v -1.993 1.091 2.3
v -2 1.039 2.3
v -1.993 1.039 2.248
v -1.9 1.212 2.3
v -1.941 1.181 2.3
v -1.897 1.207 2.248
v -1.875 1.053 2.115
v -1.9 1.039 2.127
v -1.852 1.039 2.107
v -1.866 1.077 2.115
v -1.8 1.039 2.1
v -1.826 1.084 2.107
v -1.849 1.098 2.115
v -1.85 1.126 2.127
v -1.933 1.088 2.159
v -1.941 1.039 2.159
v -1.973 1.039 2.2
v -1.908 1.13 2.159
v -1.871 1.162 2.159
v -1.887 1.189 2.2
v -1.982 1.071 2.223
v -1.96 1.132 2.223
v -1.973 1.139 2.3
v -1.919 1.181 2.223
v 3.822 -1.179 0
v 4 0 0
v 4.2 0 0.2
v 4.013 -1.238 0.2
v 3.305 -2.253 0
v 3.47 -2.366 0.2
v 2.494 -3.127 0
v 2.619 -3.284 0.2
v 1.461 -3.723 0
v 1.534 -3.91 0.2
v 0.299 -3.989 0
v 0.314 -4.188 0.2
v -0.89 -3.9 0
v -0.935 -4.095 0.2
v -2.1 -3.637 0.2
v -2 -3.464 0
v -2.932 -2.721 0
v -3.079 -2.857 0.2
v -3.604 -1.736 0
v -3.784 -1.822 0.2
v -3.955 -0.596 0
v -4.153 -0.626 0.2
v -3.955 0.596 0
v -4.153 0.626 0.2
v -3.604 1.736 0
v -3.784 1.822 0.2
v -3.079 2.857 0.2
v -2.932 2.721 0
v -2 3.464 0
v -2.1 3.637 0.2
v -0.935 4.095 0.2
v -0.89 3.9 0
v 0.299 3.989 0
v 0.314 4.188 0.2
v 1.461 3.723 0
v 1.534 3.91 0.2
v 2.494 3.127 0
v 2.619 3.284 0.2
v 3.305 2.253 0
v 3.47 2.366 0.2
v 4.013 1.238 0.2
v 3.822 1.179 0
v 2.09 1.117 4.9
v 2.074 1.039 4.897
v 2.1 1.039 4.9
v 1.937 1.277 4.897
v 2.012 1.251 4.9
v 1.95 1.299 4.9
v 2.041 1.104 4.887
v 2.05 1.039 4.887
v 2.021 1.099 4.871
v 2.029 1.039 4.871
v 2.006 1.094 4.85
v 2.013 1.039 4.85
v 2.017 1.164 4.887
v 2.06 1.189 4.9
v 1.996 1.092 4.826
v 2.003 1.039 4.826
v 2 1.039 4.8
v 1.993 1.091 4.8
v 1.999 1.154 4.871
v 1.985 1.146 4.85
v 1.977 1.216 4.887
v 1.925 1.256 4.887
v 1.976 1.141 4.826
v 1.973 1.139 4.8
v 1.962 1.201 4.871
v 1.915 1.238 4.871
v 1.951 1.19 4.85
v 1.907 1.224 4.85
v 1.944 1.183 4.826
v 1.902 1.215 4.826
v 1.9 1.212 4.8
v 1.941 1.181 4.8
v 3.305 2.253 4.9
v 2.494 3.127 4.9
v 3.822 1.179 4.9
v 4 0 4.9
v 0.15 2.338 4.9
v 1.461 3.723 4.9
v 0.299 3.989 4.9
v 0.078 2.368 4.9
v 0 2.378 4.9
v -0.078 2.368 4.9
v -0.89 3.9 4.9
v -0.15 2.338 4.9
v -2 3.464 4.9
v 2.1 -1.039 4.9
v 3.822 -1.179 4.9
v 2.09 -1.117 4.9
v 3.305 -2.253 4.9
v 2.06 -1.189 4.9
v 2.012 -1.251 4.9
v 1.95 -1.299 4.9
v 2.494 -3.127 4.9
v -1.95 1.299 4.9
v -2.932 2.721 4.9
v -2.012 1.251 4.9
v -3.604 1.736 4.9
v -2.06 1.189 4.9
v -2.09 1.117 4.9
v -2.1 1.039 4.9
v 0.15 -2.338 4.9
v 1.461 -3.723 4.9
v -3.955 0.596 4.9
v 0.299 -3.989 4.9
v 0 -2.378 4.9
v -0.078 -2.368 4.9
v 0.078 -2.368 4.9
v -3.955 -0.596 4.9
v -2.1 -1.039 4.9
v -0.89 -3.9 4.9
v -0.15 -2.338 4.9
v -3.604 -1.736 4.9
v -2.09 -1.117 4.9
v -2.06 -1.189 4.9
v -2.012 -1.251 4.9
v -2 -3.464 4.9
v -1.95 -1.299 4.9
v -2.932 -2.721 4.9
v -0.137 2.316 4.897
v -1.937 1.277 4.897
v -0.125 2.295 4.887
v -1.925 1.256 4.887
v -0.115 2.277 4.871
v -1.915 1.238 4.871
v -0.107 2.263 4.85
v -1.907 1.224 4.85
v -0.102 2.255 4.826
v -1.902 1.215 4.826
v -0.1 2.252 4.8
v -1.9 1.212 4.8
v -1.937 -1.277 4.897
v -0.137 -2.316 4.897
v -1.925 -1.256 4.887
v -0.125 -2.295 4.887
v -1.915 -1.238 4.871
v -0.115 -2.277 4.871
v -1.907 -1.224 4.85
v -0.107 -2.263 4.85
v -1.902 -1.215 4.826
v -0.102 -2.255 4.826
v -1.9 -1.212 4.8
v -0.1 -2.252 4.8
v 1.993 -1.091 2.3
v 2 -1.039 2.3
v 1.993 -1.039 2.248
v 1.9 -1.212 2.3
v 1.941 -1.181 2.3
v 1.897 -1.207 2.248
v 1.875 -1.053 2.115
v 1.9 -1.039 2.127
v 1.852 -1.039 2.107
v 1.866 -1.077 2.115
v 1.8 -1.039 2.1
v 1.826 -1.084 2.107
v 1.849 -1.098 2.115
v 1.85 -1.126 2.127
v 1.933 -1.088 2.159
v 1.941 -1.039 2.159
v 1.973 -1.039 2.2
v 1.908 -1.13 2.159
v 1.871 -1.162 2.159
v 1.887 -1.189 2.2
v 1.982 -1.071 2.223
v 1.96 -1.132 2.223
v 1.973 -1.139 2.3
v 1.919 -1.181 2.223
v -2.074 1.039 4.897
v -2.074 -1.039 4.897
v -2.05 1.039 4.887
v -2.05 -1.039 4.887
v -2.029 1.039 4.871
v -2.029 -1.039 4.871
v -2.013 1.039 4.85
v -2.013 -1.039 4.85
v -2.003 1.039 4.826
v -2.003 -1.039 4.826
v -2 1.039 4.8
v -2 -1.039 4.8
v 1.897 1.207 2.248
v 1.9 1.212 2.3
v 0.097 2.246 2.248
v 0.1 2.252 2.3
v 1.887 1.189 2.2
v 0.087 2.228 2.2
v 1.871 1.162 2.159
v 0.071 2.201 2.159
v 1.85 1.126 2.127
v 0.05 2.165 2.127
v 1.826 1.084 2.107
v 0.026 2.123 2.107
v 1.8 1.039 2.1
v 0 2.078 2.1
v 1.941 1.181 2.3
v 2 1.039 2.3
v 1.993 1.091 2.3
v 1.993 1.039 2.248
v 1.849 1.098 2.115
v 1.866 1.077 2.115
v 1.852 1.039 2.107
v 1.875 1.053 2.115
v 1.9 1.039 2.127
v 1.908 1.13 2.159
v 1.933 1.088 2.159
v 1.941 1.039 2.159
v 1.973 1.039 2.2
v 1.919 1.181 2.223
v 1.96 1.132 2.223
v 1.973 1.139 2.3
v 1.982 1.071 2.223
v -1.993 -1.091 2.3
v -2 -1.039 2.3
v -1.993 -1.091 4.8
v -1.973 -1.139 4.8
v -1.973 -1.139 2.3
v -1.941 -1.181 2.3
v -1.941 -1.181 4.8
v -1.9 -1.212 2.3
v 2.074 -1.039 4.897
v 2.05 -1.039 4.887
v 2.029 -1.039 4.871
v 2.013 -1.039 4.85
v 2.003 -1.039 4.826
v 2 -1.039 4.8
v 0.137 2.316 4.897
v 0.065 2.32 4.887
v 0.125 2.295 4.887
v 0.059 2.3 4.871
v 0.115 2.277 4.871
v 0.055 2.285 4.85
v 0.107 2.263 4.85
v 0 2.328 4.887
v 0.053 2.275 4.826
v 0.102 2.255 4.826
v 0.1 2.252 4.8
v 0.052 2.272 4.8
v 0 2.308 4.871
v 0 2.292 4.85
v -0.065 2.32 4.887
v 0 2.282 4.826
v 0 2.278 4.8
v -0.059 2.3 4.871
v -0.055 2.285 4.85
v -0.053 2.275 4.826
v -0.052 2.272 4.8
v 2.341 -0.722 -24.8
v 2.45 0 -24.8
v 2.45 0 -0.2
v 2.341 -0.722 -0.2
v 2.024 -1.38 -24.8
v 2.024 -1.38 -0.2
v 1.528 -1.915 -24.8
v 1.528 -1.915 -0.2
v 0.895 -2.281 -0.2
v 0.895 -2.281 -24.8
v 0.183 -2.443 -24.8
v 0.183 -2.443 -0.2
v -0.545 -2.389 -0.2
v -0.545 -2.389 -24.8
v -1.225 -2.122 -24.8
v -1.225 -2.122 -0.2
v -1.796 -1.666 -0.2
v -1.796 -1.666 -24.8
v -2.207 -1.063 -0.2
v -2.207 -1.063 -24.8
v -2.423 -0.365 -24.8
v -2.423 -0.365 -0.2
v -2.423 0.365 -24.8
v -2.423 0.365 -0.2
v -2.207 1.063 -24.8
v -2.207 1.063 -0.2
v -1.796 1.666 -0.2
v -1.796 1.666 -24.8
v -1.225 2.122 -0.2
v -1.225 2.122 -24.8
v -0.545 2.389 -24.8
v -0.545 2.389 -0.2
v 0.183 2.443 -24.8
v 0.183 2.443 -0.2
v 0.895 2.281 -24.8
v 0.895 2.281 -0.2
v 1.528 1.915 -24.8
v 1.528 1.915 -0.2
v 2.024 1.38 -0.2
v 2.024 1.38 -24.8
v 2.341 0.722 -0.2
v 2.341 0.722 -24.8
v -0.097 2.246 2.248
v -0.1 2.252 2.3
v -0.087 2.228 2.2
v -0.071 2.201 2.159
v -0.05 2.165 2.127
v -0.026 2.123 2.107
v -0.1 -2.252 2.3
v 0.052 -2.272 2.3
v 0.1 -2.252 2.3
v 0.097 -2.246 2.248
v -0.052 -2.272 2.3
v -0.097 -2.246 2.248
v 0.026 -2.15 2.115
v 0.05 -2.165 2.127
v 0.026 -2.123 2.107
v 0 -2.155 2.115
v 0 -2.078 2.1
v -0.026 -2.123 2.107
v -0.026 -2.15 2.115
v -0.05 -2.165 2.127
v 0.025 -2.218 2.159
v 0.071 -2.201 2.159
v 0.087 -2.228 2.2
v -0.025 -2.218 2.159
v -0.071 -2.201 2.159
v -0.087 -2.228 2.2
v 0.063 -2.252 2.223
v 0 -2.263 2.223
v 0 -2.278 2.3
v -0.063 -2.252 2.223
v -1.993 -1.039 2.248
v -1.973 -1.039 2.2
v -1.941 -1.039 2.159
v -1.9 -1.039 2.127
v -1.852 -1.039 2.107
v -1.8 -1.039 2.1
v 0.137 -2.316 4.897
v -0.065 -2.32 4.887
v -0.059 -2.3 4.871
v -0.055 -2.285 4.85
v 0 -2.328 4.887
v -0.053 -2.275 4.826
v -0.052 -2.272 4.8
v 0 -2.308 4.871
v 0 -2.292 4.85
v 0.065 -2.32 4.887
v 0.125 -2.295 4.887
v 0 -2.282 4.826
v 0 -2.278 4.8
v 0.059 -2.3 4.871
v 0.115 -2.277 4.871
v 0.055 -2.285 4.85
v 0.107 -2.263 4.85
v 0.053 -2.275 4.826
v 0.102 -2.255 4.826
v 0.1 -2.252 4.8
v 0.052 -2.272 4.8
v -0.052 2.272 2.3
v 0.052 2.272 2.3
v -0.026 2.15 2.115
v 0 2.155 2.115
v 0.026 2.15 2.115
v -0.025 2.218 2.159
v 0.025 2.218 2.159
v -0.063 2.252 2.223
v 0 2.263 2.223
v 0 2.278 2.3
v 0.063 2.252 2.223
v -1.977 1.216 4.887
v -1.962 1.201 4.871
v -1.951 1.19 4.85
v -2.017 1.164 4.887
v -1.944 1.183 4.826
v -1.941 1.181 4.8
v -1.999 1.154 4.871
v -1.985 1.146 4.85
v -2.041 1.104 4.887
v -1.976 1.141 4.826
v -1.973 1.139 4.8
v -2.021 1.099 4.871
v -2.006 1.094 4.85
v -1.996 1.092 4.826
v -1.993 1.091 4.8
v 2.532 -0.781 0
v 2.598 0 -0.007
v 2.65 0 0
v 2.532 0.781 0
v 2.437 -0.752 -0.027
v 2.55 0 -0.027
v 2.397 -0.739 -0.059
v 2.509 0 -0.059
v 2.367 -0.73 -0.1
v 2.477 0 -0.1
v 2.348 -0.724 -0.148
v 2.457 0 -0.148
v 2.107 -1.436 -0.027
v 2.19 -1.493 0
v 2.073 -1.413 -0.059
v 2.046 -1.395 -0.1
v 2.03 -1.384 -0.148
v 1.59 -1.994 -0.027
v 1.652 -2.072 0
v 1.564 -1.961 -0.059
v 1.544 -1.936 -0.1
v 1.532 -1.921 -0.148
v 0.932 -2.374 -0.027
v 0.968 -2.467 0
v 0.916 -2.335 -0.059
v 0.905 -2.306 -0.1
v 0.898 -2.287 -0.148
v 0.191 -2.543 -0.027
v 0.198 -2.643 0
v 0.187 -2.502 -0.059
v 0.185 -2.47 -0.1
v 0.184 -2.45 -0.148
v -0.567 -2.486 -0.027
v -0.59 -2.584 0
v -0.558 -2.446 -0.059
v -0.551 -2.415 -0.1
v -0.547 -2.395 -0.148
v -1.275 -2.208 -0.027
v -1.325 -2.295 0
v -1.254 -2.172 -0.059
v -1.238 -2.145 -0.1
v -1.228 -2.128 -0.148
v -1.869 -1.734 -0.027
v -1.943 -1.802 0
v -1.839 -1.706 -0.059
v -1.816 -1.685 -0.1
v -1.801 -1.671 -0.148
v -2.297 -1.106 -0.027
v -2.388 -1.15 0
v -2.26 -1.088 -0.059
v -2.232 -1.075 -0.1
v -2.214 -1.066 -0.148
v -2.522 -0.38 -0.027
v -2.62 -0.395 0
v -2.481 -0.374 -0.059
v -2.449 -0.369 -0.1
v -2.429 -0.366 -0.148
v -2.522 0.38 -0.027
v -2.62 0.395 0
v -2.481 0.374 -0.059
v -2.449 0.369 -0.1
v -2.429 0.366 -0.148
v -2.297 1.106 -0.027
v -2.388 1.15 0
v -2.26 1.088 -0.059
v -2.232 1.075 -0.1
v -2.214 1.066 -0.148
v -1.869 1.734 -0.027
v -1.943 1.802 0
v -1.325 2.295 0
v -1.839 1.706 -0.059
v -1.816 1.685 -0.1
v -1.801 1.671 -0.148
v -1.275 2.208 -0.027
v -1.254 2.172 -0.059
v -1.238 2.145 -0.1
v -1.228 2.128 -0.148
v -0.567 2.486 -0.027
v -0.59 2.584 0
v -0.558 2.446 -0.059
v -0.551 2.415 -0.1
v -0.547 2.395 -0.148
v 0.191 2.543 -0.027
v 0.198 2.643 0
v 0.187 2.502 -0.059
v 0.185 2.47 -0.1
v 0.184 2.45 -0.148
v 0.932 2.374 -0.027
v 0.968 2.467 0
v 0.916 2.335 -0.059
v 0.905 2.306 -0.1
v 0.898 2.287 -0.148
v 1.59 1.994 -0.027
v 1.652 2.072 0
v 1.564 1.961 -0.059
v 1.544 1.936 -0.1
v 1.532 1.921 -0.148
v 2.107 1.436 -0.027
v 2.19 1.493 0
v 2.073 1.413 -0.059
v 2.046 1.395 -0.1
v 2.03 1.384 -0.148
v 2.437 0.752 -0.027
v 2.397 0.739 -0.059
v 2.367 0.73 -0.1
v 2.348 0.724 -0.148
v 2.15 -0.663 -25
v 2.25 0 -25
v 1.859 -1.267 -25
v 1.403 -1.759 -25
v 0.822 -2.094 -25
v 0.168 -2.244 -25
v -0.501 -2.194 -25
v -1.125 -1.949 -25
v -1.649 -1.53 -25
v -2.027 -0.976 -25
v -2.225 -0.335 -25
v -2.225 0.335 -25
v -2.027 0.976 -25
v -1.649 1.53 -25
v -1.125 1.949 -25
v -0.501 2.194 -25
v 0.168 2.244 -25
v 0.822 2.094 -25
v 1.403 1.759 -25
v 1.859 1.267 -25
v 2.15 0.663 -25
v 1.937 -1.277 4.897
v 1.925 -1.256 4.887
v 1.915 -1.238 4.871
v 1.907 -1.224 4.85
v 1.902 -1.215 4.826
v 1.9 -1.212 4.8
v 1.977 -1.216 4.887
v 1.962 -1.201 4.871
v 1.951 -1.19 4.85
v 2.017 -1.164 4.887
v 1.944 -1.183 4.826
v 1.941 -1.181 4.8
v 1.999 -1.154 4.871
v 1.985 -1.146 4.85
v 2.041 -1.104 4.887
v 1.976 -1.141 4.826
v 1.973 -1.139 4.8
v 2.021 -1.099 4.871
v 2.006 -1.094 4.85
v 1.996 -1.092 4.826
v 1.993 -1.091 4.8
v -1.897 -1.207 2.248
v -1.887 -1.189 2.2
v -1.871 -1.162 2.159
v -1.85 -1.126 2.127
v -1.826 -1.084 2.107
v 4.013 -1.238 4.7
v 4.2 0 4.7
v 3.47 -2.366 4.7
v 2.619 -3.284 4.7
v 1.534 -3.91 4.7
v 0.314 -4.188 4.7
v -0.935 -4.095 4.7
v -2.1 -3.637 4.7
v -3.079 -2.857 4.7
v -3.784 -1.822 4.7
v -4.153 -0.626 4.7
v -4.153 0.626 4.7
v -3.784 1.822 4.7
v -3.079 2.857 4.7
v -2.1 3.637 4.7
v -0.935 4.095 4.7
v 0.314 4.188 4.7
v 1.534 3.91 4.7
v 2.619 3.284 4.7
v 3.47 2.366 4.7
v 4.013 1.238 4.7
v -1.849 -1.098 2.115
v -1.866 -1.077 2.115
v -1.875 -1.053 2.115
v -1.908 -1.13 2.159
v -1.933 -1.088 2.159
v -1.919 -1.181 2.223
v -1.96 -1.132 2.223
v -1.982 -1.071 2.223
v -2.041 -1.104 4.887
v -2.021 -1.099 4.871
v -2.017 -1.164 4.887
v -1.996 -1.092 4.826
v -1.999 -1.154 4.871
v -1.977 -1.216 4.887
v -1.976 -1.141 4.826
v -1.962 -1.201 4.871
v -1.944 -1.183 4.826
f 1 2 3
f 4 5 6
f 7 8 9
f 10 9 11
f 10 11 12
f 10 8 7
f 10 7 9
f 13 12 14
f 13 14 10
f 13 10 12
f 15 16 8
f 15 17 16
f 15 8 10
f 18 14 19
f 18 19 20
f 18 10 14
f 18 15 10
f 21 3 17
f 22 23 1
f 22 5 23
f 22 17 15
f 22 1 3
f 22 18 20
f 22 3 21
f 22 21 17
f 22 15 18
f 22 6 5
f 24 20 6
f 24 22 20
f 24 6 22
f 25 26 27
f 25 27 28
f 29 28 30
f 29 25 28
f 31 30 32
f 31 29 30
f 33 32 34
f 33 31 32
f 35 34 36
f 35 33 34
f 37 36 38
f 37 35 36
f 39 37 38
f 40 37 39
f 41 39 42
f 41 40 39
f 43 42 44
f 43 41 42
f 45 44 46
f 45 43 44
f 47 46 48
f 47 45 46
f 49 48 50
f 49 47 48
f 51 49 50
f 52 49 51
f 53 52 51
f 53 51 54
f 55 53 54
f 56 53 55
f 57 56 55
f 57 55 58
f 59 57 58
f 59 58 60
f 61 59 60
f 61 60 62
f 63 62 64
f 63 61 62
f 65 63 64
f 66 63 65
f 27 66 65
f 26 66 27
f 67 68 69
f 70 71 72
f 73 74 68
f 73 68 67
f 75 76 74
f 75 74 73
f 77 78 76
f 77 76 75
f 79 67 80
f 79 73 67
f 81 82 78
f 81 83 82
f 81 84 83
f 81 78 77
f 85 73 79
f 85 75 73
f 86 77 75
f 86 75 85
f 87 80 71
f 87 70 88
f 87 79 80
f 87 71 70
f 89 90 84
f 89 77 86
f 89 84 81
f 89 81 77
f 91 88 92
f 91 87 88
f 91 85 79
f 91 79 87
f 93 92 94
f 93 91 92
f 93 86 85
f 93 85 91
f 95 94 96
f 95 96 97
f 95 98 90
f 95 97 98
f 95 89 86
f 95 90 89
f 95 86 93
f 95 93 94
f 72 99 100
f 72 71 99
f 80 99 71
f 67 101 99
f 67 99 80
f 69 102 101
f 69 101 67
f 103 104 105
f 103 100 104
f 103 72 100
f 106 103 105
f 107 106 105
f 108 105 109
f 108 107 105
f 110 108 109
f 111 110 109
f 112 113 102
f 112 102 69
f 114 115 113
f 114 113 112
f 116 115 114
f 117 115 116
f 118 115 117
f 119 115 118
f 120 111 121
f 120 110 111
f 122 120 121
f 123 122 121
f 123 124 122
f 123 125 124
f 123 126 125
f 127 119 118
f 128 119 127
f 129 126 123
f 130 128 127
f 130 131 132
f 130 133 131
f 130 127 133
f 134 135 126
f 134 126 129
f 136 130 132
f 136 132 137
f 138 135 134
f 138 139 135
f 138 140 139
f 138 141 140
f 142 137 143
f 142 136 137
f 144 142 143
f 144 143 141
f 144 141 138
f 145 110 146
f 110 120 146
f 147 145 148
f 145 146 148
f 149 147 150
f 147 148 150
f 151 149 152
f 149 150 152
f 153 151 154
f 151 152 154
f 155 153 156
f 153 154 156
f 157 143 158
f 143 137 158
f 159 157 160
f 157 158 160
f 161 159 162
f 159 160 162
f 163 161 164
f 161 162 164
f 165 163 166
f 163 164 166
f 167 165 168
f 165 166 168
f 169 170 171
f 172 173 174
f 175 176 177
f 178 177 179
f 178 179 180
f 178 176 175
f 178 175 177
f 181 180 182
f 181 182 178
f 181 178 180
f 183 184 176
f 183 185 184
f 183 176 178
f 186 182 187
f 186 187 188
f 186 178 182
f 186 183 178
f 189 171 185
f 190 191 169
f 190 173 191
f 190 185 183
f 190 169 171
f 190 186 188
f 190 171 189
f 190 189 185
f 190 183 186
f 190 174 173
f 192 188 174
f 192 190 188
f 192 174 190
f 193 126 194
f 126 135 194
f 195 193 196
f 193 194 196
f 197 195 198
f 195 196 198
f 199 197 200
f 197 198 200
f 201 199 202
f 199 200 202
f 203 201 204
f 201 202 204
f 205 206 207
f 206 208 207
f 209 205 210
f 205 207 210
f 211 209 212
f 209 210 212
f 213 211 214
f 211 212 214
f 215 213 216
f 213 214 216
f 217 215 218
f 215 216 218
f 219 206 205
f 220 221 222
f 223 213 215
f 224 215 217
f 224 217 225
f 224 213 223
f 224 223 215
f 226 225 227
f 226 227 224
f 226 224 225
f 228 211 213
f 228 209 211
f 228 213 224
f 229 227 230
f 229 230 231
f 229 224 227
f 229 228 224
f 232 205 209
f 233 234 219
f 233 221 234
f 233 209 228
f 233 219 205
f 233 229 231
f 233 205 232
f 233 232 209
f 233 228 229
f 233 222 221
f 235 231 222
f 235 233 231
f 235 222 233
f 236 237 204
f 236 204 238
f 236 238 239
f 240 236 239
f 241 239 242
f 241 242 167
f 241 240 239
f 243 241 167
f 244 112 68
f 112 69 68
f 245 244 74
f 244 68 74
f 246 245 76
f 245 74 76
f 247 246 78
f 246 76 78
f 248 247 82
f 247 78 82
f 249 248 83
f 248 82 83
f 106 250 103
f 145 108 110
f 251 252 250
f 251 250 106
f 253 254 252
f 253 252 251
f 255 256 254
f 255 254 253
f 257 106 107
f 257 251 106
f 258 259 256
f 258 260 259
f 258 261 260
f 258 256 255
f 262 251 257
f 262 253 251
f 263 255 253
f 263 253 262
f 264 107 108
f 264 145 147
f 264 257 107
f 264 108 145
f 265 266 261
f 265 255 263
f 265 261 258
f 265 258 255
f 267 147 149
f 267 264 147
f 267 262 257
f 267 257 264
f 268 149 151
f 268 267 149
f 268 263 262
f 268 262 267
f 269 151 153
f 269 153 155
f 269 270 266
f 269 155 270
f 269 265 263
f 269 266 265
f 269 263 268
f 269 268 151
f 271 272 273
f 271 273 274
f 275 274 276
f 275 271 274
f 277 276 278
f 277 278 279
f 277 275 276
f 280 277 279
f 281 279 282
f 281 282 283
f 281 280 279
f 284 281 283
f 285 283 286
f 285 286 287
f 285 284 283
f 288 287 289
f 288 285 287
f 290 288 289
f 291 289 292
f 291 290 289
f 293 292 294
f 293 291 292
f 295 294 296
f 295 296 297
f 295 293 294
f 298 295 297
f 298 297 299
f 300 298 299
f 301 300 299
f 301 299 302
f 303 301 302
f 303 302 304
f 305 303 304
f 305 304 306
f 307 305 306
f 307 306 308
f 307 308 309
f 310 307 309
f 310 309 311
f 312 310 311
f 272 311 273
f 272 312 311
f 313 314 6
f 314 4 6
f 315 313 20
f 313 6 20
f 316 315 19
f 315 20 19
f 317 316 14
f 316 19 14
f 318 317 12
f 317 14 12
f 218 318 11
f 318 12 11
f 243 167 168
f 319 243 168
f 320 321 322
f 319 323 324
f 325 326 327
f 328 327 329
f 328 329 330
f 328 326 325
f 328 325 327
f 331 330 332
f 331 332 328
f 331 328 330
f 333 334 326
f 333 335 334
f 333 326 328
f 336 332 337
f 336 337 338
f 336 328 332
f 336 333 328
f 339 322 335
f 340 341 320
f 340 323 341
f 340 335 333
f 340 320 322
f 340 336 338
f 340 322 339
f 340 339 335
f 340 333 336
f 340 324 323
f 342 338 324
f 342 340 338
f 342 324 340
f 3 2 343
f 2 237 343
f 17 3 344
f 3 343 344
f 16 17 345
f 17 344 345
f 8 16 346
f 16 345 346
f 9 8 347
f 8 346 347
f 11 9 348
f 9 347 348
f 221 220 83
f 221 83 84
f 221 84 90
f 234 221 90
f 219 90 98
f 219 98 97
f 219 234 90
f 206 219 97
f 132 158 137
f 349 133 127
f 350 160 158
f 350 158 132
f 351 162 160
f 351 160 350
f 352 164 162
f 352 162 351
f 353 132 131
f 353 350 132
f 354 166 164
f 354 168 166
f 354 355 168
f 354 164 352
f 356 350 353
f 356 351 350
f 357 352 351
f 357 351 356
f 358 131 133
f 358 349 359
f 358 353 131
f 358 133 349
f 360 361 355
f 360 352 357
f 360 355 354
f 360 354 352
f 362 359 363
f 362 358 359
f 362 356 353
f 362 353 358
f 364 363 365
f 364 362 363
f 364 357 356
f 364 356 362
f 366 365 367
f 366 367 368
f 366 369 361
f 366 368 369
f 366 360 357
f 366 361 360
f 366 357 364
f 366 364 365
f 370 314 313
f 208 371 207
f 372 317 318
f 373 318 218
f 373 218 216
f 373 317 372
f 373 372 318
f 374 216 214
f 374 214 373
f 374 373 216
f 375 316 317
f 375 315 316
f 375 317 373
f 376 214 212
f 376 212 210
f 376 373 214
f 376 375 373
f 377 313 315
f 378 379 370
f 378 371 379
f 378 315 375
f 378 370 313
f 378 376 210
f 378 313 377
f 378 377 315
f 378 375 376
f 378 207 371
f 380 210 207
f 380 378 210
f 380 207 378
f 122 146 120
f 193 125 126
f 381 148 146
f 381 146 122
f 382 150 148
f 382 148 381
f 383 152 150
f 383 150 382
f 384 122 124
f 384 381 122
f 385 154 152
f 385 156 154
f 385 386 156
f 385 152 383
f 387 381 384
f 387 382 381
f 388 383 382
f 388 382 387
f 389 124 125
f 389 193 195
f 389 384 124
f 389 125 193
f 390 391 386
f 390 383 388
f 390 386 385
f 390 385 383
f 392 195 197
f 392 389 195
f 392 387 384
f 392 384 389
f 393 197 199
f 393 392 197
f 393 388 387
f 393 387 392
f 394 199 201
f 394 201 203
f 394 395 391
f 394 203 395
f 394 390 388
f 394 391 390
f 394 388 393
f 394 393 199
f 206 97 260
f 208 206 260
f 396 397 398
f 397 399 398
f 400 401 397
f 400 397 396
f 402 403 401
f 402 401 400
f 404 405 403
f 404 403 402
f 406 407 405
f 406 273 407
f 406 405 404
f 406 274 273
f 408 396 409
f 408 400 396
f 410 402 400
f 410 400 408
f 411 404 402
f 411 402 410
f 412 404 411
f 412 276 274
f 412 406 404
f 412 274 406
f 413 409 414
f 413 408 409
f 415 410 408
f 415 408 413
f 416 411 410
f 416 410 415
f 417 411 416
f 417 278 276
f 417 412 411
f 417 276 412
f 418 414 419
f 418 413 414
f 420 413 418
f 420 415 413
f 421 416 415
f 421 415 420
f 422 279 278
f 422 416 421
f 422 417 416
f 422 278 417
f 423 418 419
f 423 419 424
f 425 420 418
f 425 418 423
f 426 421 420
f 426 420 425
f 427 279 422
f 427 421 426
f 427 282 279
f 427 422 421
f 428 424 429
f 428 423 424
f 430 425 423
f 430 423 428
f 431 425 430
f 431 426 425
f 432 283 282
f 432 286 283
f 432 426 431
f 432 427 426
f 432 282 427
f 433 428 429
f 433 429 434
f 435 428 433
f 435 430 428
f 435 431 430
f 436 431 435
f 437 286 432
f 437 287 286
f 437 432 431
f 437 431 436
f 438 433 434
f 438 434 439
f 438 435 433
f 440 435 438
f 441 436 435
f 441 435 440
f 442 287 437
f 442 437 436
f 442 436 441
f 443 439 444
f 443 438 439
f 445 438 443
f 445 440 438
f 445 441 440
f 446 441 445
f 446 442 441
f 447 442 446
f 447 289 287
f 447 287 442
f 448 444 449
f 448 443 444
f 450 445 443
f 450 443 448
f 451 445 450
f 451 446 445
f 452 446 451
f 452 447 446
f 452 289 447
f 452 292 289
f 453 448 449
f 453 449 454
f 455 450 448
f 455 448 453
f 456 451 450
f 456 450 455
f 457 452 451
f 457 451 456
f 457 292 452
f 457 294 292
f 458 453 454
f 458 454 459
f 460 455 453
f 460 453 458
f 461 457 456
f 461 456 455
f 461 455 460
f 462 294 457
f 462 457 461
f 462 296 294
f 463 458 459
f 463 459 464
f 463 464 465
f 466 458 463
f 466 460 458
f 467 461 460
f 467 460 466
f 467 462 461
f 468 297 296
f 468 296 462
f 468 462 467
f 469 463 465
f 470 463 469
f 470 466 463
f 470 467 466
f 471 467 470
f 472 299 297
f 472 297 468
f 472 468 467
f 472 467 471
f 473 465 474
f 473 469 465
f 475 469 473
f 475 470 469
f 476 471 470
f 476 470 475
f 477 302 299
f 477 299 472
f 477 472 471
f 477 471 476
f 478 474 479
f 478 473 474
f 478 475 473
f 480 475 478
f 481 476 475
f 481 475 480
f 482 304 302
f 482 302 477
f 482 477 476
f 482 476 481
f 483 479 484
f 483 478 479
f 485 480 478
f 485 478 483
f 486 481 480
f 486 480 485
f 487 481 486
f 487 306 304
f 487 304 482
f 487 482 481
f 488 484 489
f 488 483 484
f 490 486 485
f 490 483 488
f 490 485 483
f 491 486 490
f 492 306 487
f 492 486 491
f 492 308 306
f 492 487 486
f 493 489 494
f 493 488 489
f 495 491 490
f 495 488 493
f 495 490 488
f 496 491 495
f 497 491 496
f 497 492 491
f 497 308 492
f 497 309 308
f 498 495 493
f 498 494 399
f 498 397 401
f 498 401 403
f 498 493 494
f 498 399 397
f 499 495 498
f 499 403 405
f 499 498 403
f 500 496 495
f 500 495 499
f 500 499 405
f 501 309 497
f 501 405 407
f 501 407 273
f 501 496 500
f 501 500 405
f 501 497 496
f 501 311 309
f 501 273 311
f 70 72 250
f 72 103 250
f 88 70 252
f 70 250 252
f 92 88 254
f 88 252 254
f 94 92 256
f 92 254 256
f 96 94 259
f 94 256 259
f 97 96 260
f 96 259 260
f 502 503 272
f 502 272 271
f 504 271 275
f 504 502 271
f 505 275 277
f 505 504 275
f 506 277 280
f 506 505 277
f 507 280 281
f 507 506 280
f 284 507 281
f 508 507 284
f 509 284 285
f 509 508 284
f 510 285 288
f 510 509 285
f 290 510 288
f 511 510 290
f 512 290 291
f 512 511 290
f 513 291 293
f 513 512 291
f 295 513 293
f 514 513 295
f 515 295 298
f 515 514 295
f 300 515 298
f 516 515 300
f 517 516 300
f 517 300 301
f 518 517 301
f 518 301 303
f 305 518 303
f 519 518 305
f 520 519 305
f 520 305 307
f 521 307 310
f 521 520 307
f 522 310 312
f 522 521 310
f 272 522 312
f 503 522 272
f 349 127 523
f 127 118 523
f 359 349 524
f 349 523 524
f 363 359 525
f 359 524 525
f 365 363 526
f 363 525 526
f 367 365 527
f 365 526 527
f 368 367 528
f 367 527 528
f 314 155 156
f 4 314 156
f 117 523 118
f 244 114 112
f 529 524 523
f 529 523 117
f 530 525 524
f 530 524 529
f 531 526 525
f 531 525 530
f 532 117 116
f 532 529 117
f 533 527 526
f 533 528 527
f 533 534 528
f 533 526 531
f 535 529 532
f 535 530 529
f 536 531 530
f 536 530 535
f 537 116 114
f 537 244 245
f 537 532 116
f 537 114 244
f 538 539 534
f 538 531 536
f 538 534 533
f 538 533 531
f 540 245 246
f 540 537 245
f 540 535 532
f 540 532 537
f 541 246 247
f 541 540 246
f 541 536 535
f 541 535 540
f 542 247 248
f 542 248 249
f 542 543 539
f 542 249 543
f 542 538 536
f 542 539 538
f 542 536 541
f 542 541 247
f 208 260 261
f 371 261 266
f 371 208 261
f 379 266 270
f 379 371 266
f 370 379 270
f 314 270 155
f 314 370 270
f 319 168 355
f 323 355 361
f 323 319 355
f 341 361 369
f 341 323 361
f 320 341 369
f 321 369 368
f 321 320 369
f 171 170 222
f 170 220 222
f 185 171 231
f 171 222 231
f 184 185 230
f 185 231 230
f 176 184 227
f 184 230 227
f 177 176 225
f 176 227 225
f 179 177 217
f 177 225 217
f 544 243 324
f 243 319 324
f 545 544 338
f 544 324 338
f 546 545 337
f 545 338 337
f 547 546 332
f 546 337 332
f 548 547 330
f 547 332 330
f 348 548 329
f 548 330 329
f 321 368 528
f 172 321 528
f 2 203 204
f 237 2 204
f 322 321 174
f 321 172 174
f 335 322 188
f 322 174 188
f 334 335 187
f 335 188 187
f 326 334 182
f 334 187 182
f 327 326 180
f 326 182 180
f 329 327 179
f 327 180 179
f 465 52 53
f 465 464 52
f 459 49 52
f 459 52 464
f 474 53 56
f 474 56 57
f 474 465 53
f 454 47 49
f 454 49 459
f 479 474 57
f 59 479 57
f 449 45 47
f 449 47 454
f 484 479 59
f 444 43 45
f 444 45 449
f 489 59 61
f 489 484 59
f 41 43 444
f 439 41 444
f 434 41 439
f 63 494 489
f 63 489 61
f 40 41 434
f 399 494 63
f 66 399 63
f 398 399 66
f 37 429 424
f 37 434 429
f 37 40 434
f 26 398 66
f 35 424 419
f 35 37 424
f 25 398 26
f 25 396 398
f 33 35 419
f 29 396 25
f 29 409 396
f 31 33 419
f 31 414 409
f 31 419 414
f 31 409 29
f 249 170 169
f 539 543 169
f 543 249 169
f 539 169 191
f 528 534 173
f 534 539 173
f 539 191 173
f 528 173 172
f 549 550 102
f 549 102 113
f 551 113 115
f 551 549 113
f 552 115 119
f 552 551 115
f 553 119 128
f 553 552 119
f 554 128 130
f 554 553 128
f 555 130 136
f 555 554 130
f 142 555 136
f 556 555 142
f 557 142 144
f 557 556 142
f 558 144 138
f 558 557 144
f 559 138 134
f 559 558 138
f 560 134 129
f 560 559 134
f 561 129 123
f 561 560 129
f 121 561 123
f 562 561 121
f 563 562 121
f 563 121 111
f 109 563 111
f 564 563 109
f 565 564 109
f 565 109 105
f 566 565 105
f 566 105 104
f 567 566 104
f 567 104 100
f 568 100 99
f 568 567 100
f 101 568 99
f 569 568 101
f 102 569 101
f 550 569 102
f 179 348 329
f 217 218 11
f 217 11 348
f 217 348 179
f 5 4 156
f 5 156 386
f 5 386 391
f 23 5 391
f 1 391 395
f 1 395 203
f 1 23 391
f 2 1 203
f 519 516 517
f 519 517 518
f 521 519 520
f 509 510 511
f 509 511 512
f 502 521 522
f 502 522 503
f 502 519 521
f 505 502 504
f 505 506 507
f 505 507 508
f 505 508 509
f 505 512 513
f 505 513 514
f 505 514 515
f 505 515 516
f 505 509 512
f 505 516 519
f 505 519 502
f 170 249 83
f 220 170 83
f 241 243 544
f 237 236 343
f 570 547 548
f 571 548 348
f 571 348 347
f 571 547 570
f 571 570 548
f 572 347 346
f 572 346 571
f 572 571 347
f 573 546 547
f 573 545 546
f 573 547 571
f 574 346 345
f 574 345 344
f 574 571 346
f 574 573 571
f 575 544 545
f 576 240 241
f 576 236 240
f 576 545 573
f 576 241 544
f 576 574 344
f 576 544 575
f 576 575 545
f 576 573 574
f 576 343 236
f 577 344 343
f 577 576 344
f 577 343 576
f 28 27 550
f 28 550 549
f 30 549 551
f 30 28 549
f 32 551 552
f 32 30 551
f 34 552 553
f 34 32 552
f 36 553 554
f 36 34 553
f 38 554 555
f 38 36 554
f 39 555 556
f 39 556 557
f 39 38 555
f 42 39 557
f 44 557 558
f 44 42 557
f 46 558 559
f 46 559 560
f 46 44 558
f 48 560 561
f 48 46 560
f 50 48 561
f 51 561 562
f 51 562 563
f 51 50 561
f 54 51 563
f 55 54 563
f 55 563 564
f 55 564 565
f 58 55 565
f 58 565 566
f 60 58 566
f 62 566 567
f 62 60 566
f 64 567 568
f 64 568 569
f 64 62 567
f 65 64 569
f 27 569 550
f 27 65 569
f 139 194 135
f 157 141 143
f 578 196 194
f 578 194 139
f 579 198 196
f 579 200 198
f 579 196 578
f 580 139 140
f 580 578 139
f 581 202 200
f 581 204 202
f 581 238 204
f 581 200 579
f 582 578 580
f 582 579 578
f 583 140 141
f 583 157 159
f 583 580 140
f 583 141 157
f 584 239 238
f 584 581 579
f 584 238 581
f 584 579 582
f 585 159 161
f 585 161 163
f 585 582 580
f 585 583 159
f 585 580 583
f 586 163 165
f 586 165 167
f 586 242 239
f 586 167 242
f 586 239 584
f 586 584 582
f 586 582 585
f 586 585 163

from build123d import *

# Parameters (mm, degrees)
SCHNITT_LINEAR_AUSTRAGEN1_DEPTH = 2.8
FASE1_SIZE                      = 0.2
VERRUNDUNG1_R                   = 0.2
VERRUNDUNG2_R                   = 0.1


with BuildPart() as part:
    # Skizze1 → Rotation1 (revolve)
    with BuildSketch(Plane(origin=(0, 0, 0), x_dir=(0, 0, -1), z_dir=(1, 0, 0))):
        Polygon((-4.9, 0), (-4.9, 4.2), (0, 4.2), (0, 2.45), (25, 2.45), (25, 0), align=None)
    revolve(axis=Axis((0, 0, 21.919879518), (0, 0, -1)))

    # Skizze2 → Schnitt-Linear austragen1 (cut)
    with BuildSketch(Plane.XY.offset(4.9)):
        Polygon((2, -1.154700538), (2, 1.154700538), (0, 2.309401077), (-2, 1.154700538), (-2, -1.154700538), (0, -2.309401077), align=None)
    extrude(amount=-SCHNITT_LINEAR_AUSTRAGEN1_DEPTH, mode=Mode.SUBTRACT)

    # Fase1
    fase1_edges = [part.edges().sort_by_distance(p)[0] for p in [
        (0, -4.2, 4.9),
        (0, -4.2, 0),
        (0, -2.45, -25),
    ]]
    chamfer(fase1_edges, length=FASE1_SIZE)

    # Verrundung1
    verrundung1_edges = [part.edges().sort_by_distance(p)[0] for p in [
        (-1, -1.732050808, 2.1),
        (-2, 0, 2.1),
        (-1, 1.732050808, 2.1),
        (1, 1.732050808, 2.1),
        (2, 0, 2.1),
        (1, -1.732050808, 2.1),
        (-2, -1.154700538, 3.5),
        (0, -2.309401077, 3.5),
        (2, -1.154700538, 3.5),
        (2, 1.154700538, 3.5),
        (0, 2.309401077, 3.5),
        (-2, 1.154700538, 3.5),
        (0, -2.45, 0),
    ]]
    fillet(verrundung1_edges, radius=VERRUNDUNG1_R)

    # Verrundung2
    verrundung2_edges = [part.edges().sort_by_distance(p)[0] for p in [
        (1.973205081, -1.139230485, 4.9),
        (1, -1.732050808, 4.9),
        (0, -2.278460969, 4.9),
        (-1, -1.732050808, 4.9),
        (-1.973205081, -1.139230485, 4.9),
        (-2, 0, 4.9),
        (-1.973205081, 1.139230485, 4.9),
        (-1, 1.732050808, 4.9),
        (0, 2.278460969, 4.9),
        (1, 1.732050808, 4.9),
        (1.973205081, 1.139230485, 4.9),
        (2, 0, 4.9),
    ]]
    fillet(verrundung2_edges, radius=VERRUNDUNG2_R)


solid = part.part
